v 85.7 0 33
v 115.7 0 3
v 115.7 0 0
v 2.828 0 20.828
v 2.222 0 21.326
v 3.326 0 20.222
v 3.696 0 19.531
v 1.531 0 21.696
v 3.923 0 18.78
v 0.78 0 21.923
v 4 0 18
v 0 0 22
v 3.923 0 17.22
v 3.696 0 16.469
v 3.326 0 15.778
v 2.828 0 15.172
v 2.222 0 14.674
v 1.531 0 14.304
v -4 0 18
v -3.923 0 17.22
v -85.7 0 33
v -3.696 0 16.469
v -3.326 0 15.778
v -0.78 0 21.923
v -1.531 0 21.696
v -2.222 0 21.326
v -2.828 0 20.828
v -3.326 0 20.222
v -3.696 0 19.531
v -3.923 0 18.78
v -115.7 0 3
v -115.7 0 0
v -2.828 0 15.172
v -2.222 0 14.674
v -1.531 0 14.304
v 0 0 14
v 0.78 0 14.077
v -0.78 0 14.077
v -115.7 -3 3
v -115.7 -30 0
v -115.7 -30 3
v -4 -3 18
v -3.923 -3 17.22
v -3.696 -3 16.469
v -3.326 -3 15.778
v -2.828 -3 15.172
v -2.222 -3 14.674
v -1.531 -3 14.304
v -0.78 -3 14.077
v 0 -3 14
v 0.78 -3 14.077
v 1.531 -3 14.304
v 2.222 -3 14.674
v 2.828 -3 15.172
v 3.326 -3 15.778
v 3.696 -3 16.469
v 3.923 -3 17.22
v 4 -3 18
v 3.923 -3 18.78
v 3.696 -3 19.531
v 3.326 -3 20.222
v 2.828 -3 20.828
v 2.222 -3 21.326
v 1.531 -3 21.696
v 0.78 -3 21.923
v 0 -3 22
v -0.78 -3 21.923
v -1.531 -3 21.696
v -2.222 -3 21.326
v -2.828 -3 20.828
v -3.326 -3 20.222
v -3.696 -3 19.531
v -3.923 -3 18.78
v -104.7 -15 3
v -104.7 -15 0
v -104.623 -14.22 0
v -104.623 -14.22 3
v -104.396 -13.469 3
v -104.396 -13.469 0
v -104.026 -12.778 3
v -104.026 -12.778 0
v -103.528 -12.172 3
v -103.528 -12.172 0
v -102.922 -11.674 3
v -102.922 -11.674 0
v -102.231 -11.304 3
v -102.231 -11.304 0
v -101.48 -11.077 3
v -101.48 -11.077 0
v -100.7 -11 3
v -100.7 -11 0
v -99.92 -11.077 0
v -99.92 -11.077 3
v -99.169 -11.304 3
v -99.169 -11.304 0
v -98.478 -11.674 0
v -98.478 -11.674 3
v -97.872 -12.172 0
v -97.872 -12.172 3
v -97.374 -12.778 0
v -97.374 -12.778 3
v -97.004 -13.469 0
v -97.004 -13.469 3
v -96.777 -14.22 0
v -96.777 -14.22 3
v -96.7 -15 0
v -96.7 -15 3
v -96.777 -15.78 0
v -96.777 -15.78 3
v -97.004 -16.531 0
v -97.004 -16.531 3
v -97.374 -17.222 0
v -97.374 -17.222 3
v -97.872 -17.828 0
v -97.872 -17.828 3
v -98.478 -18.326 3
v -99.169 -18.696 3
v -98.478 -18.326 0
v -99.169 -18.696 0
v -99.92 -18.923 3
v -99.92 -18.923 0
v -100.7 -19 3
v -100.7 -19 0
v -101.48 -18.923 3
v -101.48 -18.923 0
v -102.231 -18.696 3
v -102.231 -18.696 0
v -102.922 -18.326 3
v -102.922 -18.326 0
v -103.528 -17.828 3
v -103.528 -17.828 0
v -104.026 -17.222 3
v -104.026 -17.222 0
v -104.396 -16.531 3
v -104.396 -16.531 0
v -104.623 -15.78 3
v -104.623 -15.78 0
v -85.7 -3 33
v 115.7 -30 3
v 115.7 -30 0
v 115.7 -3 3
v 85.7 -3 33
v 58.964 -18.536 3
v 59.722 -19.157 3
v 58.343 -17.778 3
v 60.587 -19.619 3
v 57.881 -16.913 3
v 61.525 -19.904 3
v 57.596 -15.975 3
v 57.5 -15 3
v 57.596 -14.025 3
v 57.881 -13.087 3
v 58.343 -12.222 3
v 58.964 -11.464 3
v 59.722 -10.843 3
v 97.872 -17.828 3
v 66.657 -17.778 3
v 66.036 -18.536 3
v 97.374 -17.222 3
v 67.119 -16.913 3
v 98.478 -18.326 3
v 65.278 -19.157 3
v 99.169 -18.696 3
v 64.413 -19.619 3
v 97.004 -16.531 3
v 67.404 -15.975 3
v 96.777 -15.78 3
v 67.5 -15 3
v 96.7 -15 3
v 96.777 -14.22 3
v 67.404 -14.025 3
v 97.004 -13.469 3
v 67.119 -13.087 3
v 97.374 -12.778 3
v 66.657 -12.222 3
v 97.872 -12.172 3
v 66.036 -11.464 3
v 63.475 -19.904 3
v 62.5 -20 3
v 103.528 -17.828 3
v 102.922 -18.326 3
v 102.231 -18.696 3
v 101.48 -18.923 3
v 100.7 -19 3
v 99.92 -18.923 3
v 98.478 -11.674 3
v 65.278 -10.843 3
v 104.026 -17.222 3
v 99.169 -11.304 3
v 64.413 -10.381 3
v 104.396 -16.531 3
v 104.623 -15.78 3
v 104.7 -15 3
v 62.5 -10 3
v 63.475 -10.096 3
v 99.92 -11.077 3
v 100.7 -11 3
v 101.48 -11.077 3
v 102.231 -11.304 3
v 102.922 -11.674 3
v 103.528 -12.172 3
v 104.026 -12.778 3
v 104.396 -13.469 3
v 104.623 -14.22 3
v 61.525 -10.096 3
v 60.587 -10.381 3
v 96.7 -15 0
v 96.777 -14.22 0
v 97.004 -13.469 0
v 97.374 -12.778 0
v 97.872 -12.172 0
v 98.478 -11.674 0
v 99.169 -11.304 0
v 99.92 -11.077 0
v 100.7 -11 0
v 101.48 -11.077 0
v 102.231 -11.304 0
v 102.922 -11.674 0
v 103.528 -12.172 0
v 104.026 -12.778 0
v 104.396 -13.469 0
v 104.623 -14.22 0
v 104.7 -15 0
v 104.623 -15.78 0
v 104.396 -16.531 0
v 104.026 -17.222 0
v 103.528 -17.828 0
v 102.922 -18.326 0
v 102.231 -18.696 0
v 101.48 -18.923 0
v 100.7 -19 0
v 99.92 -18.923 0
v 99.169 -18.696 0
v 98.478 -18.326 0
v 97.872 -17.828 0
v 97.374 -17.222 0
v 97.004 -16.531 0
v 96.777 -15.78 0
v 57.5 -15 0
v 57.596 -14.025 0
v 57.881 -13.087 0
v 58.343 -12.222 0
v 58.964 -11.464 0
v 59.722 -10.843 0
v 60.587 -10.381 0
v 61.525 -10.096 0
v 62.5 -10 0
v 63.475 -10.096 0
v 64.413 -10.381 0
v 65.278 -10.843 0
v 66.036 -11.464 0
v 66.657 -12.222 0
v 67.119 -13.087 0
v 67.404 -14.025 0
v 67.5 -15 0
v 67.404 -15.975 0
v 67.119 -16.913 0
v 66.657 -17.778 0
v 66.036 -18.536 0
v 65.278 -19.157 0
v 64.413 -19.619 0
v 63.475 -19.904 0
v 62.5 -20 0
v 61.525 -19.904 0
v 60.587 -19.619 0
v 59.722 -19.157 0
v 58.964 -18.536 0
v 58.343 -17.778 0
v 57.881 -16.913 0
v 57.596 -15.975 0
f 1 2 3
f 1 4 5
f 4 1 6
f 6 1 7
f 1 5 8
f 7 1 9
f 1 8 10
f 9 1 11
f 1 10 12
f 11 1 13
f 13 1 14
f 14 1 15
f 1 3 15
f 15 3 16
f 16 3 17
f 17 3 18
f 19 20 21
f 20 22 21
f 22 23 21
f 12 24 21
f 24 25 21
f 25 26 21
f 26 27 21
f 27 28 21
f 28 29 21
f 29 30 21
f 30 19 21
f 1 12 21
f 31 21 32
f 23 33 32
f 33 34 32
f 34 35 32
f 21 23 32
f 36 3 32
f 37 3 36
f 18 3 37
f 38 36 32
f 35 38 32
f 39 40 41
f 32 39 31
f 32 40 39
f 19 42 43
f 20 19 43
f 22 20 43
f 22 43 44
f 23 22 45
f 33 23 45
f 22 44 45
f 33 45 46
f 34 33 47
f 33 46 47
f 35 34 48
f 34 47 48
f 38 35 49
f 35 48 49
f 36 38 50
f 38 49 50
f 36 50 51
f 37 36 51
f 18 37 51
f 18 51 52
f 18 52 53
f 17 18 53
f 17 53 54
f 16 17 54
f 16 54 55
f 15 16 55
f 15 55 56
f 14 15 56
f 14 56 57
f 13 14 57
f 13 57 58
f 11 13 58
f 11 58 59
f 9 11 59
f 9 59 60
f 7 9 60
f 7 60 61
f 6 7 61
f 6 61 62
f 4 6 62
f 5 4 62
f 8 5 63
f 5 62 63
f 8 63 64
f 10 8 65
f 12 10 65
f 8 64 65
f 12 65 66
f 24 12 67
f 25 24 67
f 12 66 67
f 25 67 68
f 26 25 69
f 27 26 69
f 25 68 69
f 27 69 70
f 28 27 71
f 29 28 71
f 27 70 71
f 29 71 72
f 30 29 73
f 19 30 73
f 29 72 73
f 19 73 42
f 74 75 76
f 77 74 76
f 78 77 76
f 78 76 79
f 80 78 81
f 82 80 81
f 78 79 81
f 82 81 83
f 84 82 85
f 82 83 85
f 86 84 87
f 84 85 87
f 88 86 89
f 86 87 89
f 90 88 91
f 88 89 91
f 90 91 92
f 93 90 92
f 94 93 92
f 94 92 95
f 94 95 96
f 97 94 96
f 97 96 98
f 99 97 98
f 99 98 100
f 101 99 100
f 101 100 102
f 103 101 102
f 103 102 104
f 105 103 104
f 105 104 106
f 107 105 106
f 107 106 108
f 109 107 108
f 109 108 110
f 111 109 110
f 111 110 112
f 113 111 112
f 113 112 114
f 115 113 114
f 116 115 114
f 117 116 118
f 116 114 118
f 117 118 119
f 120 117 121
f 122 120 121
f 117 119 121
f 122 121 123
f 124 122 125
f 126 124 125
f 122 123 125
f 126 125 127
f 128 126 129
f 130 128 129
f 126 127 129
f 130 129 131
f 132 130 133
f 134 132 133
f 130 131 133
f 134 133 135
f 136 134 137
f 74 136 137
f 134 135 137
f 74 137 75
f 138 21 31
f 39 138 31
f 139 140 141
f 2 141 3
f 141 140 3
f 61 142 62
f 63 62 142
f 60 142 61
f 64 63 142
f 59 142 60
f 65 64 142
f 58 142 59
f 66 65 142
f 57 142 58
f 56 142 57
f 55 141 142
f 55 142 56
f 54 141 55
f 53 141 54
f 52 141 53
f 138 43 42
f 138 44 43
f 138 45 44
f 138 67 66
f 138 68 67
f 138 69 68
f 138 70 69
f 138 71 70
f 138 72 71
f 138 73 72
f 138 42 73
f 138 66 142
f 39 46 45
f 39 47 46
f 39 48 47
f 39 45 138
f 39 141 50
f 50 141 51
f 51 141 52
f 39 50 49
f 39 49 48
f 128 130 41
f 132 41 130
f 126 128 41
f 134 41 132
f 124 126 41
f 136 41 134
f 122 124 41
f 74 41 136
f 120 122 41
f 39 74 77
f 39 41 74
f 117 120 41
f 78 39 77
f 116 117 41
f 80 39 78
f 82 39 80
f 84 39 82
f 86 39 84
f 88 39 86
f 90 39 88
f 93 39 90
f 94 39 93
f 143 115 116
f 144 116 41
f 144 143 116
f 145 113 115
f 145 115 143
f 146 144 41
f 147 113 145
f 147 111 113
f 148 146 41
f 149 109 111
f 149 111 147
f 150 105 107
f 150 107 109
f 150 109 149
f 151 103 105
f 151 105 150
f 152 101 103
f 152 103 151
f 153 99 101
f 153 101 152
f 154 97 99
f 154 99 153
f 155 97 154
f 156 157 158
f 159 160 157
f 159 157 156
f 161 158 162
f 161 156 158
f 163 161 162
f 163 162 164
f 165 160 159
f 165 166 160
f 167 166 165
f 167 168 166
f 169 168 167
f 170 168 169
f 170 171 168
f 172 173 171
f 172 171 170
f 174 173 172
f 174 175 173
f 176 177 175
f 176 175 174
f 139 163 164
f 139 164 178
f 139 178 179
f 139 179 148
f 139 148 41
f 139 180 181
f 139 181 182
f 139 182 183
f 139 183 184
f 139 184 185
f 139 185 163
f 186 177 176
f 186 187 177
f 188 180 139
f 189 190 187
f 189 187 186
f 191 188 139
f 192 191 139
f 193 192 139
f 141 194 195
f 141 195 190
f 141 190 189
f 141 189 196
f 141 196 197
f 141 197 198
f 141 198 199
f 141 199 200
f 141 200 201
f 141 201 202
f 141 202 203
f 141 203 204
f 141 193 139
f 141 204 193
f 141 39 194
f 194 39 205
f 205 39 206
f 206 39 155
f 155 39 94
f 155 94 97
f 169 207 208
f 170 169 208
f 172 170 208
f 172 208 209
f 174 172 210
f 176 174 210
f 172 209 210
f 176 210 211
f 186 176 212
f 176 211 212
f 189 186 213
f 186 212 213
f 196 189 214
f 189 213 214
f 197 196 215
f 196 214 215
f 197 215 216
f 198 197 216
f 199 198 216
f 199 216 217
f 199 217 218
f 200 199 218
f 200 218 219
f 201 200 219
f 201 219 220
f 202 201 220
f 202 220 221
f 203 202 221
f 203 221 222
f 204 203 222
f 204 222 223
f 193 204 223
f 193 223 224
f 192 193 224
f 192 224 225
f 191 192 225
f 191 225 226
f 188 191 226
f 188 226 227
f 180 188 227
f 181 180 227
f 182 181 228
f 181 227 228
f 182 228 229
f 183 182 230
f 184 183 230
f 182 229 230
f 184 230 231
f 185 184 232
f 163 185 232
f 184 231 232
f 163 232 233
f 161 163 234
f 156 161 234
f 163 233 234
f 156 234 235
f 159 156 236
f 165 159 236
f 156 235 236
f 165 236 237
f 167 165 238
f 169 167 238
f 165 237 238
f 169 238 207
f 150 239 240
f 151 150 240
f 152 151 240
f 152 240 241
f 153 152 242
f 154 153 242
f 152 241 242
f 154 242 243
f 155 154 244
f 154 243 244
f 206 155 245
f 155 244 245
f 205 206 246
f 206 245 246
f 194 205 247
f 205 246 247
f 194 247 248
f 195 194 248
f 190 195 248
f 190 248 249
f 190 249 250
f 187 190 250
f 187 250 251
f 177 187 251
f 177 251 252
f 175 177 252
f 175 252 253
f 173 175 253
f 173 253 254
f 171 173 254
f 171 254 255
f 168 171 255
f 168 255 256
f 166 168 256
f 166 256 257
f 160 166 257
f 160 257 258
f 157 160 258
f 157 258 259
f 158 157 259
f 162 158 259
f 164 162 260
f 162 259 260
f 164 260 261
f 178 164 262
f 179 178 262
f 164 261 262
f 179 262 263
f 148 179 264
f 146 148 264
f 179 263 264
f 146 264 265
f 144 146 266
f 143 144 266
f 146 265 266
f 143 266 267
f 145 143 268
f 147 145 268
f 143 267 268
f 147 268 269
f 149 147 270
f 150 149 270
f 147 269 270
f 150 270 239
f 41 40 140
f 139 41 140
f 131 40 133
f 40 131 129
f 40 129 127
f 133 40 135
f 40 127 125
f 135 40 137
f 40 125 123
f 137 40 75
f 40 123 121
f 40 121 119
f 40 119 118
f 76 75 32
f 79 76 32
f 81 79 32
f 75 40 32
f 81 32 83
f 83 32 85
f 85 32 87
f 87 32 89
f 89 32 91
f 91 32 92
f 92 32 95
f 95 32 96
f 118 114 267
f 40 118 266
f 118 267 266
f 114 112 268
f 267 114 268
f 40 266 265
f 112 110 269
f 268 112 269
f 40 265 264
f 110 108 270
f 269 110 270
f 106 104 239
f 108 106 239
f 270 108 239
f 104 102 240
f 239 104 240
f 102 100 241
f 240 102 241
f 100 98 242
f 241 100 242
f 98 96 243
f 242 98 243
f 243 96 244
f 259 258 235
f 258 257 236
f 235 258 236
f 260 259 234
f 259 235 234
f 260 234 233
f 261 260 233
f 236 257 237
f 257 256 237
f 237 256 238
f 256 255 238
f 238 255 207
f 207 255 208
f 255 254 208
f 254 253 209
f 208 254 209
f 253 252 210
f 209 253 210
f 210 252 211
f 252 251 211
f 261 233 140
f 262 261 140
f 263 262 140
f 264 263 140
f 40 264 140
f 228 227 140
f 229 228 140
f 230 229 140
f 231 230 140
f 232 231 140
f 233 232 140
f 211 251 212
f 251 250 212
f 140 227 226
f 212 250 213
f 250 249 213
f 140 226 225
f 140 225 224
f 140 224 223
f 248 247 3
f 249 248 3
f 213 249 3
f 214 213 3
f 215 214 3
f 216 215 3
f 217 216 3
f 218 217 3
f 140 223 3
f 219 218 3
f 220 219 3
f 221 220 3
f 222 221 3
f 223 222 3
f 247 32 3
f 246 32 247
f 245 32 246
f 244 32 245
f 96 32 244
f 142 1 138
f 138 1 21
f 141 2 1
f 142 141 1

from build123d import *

# Parameters (mm, degrees)
SKETCH1_W                  = 231.4
SKETCH1_H                  = 30
BOSS_EXTRUDE1_DEPTH        = 3
BOSS_EXTRUDE2_DEPTH        = 3
F_8_0_8_DIAMETER_HOLE1_D   = 8
F_8_0_8_DIAMETER_HOLE2_D   = 8
F_10_0_10_DIAMETER_HOLE1_D = 10


with BuildPart() as part:
    # Sketch1 → Boss-Extrude1 (new body)
    with BuildSketch(Plane.XY):
        with Locations((0, -15)):
            Rectangle(SKETCH1_W, SKETCH1_H)
    extrude(amount=BOSS_EXTRUDE1_DEPTH)

    # Sketch2 → Boss-Extrude2 (add)
    with BuildSketch(Plane(origin=(0, 0, 0), x_dir=(1, 0, 0), z_dir=(0, 1, 0))):
        Polygon((-115.7, -3), (115.7, -3), (85.7, -33), (-85.7, -33), align=None)
    extrude(amount=-BOSS_EXTRUDE2_DEPTH)

    # Ø8.0 (8) Diameter Hole1 (through all)
    with Locations(Plane.XY.offset(3)):
        with Locations((-100.7, -15), (100.7, -15)):
            Hole(F_8_0_8_DIAMETER_HOLE1_D / 2)

    # Ø8.0 (8) Diameter Hole2 (through all)
    with Locations(Plane(origin=(0, 0, 0), x_dir=(1, 0, 0), z_dir=(0, 1, 0))):
        with Locations((0, -18)):
            Hole(F_8_0_8_DIAMETER_HOLE2_D / 2)

    # Ø10.0 (10) Diameter Hole1 (through all)
    with Locations(Plane.XY.offset(3)):
        with Locations((62.5, -15)):
            Hole(F_10_0_10_DIAMETER_HOLE1_D / 2)


solid = part.part
